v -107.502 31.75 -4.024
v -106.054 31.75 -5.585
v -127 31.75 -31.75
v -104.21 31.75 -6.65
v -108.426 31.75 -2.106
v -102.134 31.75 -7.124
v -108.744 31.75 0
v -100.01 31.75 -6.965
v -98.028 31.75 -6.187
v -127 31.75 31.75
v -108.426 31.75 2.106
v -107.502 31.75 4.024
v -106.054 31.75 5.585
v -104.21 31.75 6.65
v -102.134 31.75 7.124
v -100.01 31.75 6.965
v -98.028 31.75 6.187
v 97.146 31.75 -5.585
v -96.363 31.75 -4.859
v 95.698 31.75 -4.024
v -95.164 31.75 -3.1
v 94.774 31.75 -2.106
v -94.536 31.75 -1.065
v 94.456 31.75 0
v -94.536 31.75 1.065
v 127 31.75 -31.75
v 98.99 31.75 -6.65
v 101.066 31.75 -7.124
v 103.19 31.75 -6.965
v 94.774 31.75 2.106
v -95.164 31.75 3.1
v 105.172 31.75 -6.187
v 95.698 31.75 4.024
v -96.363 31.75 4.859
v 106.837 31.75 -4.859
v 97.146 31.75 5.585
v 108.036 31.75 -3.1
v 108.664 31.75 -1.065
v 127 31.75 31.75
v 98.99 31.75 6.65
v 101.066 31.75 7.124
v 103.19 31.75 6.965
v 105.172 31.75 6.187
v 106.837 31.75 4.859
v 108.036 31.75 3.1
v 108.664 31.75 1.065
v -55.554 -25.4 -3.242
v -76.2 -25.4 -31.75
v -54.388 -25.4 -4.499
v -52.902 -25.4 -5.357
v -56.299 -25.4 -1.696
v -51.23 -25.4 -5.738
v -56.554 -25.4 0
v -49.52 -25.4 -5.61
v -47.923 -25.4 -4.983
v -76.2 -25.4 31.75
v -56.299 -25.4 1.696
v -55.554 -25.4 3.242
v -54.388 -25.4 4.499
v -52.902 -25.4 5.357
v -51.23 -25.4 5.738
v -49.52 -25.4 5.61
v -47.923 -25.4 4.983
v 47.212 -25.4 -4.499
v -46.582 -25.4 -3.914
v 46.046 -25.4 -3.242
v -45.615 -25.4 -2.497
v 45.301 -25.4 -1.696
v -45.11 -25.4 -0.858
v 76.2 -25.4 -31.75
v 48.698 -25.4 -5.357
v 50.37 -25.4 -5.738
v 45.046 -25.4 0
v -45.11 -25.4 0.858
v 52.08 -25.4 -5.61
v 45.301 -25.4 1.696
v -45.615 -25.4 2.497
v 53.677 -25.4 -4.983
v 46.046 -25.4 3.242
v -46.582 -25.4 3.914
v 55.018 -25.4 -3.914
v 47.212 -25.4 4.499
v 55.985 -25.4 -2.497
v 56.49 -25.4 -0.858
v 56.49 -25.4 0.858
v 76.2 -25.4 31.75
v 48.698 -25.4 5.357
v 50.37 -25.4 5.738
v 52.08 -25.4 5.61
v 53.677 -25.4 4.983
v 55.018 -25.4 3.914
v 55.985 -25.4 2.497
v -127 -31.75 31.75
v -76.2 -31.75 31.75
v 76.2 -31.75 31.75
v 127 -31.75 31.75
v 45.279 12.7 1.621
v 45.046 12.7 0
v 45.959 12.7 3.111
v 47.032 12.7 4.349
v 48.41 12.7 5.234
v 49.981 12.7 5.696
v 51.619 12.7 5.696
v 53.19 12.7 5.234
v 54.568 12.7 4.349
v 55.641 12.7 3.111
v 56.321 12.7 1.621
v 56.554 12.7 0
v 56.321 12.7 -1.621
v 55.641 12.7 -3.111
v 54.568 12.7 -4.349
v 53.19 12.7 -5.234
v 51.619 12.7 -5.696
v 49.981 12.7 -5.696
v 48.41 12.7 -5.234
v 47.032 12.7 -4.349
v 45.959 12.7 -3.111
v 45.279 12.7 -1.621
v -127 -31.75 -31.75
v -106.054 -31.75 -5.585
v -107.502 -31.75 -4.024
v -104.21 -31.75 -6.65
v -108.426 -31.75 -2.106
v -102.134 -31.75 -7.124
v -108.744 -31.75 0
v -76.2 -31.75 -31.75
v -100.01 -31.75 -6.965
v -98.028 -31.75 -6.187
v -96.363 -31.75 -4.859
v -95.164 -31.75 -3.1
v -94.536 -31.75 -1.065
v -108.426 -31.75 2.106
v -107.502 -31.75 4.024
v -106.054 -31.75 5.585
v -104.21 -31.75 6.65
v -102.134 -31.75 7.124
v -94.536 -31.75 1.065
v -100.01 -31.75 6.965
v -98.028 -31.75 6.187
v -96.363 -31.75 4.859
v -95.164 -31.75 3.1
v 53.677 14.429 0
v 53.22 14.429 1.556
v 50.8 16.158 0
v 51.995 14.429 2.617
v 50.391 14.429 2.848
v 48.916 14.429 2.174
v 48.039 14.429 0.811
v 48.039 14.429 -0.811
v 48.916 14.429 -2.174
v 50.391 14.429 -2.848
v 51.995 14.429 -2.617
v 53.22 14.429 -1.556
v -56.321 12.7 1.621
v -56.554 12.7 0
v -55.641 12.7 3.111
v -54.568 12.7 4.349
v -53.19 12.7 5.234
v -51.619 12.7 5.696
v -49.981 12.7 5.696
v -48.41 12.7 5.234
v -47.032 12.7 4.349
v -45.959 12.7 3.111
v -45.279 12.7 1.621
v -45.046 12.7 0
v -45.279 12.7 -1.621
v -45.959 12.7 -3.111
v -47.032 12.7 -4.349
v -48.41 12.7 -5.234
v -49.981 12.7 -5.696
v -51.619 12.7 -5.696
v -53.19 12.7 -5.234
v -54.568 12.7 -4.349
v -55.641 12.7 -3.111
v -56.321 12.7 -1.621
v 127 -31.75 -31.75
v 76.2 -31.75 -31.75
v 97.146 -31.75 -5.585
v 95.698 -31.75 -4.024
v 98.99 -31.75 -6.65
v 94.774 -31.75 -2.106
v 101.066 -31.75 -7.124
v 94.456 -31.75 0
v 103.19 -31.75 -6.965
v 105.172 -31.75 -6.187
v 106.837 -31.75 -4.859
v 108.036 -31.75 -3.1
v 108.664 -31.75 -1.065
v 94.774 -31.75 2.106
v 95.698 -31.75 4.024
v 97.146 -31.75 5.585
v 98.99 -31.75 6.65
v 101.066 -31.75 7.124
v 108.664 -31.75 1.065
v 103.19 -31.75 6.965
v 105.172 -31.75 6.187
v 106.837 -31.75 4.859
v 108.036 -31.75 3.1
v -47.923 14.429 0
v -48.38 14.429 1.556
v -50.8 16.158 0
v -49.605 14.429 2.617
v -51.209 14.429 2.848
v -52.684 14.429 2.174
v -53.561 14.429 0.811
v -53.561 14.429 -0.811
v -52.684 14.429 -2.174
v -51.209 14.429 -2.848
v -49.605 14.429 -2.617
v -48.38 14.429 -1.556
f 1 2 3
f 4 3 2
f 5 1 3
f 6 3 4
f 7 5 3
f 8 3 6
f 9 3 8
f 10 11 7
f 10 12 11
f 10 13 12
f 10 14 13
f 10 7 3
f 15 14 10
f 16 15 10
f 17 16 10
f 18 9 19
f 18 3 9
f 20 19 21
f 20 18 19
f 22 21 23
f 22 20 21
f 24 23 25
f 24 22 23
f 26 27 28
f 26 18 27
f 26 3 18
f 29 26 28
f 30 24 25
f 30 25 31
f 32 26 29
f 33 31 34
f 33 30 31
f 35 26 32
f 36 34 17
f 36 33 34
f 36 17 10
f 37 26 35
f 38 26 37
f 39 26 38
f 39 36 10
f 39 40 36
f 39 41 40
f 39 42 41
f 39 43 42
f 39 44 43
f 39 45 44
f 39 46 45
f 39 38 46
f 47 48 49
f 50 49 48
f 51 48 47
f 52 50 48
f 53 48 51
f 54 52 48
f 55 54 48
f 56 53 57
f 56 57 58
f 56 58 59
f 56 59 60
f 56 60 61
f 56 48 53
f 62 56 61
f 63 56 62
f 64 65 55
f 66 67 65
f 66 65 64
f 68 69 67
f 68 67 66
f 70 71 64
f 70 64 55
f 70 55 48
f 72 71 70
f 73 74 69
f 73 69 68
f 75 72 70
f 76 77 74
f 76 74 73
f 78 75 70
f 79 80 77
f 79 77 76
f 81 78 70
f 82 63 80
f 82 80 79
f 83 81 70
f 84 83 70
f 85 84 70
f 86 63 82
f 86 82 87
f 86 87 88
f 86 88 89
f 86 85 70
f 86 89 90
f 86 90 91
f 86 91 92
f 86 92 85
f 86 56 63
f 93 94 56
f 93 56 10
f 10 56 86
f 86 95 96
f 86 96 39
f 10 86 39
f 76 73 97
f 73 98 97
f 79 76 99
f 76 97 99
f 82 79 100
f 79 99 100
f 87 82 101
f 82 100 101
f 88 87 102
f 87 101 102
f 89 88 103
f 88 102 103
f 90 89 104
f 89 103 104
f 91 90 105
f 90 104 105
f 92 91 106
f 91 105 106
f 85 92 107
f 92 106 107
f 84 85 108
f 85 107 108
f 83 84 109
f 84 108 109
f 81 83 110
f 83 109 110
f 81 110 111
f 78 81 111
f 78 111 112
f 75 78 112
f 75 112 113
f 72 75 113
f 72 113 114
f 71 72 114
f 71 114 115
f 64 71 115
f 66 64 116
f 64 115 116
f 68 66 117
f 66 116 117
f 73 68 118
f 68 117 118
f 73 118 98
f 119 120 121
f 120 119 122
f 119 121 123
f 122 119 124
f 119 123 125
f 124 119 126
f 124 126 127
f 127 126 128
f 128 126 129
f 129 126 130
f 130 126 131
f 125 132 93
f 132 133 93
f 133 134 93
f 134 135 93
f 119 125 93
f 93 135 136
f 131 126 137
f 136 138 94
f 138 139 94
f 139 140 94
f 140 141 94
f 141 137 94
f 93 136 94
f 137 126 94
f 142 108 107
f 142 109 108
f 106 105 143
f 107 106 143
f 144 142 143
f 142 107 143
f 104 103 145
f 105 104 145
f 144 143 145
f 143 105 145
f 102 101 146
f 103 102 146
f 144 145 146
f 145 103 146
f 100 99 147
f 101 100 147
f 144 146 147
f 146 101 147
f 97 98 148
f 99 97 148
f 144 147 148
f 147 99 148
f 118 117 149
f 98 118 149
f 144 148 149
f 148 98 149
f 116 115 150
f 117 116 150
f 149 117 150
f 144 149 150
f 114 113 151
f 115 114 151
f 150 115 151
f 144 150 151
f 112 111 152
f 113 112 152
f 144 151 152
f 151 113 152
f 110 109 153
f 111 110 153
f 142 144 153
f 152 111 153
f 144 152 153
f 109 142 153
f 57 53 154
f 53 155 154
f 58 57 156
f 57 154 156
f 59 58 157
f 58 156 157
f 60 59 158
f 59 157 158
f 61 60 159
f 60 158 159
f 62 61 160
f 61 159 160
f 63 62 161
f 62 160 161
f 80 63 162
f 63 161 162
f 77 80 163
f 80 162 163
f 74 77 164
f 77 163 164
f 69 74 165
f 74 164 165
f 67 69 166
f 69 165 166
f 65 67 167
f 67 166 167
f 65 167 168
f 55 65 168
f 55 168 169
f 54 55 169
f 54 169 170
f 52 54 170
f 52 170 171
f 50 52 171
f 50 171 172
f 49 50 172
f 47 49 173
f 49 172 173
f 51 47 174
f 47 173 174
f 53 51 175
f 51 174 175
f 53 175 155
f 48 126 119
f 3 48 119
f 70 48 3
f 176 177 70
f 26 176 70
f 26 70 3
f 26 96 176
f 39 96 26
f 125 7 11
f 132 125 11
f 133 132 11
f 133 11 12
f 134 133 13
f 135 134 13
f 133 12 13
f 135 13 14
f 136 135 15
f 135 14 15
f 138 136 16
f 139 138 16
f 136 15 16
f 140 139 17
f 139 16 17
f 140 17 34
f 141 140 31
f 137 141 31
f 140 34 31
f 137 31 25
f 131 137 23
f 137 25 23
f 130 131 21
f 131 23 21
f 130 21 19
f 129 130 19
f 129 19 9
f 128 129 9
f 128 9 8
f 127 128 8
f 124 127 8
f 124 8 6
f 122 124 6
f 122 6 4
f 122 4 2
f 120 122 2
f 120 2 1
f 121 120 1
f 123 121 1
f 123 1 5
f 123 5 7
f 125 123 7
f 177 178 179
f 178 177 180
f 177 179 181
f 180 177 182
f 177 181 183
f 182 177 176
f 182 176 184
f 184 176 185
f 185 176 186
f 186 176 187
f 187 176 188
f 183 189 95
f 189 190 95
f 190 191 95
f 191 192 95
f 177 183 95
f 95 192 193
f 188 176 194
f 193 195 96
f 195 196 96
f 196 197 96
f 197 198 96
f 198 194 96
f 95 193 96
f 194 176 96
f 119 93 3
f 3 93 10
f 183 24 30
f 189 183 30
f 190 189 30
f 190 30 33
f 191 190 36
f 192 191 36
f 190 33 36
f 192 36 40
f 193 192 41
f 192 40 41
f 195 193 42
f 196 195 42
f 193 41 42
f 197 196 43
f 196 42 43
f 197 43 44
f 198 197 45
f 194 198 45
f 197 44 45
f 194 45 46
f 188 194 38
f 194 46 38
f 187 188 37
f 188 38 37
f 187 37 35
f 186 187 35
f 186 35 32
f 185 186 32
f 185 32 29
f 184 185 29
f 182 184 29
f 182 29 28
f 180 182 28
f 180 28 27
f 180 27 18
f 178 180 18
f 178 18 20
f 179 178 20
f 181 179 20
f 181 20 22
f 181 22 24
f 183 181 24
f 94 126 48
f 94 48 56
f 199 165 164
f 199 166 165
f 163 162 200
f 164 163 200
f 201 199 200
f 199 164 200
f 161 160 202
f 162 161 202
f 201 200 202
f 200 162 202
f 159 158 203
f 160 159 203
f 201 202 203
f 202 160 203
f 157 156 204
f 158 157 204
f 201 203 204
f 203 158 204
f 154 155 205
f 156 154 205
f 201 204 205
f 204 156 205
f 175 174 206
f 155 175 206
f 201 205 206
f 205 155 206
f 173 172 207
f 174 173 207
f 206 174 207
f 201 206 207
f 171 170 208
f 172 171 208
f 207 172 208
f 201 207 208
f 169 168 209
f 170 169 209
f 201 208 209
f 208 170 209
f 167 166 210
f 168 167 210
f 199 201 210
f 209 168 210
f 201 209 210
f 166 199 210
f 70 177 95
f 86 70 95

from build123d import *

# Parameters (mm, degrees)
F0_W     = 63.5
F0_H     = 63.5
F1_DEPTH = 127
F3_D     = 14.2875
F4_W     = 152.4
F4_H     = 63.5
F5_DEPTH = 6.35
F7_D     = 11.50874
F7_DEPTH = 38.1
F7_TIP   = 3.4575743203


# Not quite as in the source:
# - a length typed as a fraction of an inch, garbled in the dataset ("3 / 203.2 mm" for 3/8 in), is restored


with BuildPart() as f1:
    # F0 (on Right) → F1 (new body, symmetric)
    with BuildSketch(Plane.YZ):
        Rectangle(F0_W, F0_H)
    extrude(amount=F1_DEPTH, both=True)

    # F3 (through all)
    with Locations(Plane.XZ.offset(31.75)):
        with Locations((-101.6, 0), (101.6, 0)):
            Hole(F3_D / 2)

    # F4 (on face) → F5 (cut)
    with BuildSketch(Plane.XZ.offset(31.75)):
        Rectangle(F4_W, F4_H)
    extrude(amount=-F5_DEPTH, mode=Mode.SUBTRACT)

    # F7
    with Locations(Plane.XZ.offset(25.4)):
        with Locations((-50.8, 0), (50.8, 0)):
            Hole(F7_D / 2, depth=F7_DEPTH)
            with Locations((0, 0, -(F7_DEPTH + F7_TIP / 2))):  # 118° drill point
                Cone(0, F7_D / 2, F7_TIP, mode=Mode.SUBTRACT)


solid = f1.part
